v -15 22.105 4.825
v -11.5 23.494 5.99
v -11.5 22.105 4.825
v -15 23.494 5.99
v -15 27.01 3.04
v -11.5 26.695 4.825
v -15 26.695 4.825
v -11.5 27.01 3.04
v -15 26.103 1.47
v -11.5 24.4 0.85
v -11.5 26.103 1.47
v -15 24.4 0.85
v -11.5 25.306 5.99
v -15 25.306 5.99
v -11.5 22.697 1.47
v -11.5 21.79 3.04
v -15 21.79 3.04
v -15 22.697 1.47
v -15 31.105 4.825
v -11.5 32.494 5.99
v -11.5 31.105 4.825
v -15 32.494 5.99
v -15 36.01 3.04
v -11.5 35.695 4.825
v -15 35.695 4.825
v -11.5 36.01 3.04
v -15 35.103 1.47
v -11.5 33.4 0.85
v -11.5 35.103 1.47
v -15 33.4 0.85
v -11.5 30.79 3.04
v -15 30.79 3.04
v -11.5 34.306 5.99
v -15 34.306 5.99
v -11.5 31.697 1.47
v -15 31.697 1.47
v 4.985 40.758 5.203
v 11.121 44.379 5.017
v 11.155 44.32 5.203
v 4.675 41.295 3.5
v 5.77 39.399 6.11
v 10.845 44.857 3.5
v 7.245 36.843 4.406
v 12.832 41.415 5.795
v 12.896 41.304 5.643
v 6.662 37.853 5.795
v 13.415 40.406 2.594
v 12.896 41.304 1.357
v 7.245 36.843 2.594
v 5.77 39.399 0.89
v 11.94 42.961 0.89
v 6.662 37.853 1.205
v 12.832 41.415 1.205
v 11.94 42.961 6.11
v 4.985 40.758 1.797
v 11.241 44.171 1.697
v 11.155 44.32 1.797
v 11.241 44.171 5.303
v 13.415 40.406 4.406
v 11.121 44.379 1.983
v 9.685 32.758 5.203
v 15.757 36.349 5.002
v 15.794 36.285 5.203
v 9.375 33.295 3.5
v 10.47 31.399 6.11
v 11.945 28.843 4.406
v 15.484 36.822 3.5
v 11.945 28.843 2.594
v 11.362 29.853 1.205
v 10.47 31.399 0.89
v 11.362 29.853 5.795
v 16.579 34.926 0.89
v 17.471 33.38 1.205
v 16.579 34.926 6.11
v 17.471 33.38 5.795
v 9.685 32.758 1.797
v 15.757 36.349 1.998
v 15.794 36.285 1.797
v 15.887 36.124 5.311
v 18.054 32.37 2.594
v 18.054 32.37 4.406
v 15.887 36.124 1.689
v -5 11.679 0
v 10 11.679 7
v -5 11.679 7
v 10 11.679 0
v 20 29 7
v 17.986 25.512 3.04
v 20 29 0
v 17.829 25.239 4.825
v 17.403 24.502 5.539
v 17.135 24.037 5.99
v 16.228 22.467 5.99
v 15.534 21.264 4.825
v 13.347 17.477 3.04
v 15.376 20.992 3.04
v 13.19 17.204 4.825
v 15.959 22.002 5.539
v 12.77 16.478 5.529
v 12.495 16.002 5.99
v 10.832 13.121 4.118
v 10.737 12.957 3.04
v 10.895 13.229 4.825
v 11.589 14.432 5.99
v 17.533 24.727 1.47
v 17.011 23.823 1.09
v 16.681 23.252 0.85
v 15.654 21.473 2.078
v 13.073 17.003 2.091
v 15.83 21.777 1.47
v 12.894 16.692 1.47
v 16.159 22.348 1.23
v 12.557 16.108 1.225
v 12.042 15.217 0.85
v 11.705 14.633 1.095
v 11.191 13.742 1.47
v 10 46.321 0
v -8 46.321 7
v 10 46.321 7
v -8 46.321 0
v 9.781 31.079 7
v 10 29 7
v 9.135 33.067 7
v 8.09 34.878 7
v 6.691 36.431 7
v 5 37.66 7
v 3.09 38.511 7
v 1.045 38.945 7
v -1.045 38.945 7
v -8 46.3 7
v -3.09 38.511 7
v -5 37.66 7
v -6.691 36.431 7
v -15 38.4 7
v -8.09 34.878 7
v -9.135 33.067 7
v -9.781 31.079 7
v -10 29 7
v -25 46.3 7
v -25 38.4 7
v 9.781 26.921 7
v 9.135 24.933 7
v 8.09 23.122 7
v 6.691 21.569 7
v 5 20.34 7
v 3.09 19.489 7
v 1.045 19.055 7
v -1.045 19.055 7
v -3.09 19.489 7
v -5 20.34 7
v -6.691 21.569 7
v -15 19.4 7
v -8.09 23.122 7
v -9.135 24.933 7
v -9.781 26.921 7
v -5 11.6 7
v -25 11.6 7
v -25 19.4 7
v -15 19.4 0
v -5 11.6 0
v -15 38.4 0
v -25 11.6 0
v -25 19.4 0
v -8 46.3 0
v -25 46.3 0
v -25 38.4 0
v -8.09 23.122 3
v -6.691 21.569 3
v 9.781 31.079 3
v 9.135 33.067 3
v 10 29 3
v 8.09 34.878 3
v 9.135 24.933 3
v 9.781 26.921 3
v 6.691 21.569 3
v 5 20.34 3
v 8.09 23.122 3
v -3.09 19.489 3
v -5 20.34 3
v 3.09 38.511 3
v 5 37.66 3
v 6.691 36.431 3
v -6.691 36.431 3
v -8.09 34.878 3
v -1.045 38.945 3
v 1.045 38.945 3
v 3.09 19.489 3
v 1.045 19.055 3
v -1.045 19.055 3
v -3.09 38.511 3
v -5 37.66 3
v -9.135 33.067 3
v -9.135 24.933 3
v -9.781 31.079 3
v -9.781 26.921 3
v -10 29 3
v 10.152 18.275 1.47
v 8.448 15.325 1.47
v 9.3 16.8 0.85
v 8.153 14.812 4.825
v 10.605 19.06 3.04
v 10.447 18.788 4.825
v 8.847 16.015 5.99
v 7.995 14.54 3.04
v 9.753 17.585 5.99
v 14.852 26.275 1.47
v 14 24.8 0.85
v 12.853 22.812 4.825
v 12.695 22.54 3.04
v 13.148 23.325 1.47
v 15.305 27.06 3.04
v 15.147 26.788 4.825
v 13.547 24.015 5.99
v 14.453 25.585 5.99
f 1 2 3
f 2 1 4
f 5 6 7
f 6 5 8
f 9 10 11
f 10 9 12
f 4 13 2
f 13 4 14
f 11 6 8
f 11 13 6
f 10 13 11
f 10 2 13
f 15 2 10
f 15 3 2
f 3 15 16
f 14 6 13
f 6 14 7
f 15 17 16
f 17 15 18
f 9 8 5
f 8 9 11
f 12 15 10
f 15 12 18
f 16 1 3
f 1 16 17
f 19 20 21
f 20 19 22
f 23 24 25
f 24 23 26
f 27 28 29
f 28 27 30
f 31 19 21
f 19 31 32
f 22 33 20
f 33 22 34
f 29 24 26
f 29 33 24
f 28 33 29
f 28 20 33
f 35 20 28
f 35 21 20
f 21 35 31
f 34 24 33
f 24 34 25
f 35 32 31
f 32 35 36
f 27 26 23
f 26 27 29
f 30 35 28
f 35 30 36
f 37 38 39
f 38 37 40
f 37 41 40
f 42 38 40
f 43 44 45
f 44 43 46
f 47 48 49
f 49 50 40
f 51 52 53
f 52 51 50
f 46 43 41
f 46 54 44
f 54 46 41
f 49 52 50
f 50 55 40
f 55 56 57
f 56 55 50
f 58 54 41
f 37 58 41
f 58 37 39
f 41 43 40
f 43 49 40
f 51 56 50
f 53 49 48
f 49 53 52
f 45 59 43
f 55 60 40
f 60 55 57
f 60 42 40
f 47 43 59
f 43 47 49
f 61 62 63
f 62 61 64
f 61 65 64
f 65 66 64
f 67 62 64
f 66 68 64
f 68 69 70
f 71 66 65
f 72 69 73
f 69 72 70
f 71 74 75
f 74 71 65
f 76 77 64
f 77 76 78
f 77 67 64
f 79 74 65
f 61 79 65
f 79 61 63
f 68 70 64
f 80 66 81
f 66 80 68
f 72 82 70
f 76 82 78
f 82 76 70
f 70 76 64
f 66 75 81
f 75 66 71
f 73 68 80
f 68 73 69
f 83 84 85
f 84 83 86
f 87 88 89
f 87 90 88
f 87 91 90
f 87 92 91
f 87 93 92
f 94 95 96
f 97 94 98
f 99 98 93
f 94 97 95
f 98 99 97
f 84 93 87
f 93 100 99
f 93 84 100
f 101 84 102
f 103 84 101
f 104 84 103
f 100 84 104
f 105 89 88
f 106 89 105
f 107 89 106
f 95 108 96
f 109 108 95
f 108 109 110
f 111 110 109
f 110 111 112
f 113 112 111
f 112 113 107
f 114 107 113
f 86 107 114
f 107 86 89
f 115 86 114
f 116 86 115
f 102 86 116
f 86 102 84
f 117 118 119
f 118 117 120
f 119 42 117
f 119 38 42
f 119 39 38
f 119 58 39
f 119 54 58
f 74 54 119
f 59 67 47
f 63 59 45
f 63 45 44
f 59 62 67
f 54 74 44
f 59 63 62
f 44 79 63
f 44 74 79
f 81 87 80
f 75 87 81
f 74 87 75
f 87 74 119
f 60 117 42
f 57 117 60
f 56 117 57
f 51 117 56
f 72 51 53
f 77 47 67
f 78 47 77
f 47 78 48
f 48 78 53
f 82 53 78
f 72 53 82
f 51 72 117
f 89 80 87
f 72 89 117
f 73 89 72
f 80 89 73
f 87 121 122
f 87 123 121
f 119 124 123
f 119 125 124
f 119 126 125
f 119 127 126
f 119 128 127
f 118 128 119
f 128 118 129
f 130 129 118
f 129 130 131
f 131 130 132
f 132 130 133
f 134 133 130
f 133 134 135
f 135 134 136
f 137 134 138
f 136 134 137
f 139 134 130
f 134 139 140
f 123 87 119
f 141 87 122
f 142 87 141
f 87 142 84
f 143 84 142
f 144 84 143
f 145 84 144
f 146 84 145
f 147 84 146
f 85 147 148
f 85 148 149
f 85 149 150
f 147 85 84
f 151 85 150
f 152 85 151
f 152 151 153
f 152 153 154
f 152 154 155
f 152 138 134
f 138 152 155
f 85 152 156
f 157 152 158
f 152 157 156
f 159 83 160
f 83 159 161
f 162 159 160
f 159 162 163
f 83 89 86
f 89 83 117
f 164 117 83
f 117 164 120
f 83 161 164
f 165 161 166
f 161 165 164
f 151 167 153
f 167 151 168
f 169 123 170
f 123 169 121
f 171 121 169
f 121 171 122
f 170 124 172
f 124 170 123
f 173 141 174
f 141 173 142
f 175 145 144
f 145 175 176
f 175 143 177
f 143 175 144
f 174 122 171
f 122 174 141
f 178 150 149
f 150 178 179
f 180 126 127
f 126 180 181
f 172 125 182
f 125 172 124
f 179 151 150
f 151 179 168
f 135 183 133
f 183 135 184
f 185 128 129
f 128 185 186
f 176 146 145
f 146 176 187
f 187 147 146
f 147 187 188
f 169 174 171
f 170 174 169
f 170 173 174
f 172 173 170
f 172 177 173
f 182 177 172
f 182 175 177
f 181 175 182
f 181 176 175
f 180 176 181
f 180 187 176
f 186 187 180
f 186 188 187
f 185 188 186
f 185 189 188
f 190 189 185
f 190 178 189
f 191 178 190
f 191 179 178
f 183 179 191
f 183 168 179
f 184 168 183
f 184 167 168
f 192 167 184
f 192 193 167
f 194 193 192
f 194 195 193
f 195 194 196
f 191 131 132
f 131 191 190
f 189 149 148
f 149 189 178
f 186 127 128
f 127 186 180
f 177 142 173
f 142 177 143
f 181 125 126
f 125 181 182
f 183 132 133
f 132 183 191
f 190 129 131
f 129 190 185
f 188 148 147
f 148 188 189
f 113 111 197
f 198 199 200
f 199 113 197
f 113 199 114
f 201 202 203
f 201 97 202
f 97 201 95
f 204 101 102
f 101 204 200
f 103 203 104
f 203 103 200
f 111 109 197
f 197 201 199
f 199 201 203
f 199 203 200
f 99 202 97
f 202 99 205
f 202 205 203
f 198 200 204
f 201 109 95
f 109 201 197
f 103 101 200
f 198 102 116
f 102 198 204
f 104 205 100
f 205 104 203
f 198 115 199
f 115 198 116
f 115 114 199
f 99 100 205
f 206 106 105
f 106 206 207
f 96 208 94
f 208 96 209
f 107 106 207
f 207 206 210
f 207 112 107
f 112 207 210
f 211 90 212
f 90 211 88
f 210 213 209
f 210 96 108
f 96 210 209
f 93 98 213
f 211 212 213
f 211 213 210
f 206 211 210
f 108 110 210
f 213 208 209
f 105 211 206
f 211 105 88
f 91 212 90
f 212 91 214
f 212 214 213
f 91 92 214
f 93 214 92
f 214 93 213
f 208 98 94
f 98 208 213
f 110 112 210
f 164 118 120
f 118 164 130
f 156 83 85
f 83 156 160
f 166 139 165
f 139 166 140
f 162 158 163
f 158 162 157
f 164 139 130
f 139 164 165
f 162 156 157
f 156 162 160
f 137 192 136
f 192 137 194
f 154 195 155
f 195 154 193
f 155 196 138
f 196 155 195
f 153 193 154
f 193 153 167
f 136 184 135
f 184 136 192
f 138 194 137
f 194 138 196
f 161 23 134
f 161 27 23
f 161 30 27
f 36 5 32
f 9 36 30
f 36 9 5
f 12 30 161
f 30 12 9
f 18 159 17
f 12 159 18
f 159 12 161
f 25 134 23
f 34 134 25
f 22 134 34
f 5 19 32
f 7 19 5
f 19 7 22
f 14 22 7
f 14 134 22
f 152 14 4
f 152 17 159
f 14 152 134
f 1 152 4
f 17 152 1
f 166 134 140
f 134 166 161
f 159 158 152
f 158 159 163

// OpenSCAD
z=7; //высота
g=3.5; //глубина дырок 
//дексибироза
translate ([0,79,0]) {
difference () {
translate([0,-50,0])cylinder(z,20,20, $fn=6);
translate ([0,-50,3])cylinder(4.2,10,10);
translate ([-7,0,0]) {
rotate([0, 90, 0]) translate([-3.5,-54.6,-17+g]) cylinder(9,2.65,2.65);        
rotate([0, 90, 0]) translate([-3.5,-45.6,-17+g]) cylinder(9,2.65,2.65);          
}  
translate ([9.3,-62.2,3.5])rotate([0,90,-30])cylinder (4.5+g,2.65,2.65);
translate ([14,-54.2,3.5])rotate([0,90,-30])cylinder (4.5+g,2.65,2.65);
translate ([-28,-73,-1])cube ([20,45,9]);

translate ([2,-80,0]) {
translate ([4,40,g])rotate ([90,0,120])cylinder(4.5+g,2.65,2.65);   
translate ([4+4.7,37.5+-9+g,g])rotate ([90,0,120])cylinder(4.5+3.5,2.65,2.65); 
  }  
 }
difference () {
translate ([-25,-67.4,0])cube ([20,34.7,7]);
translate ([0,-50,3])cylinder(4.2,10,10);
translate ([-7,0,0]) {
rotate([0, 90, 0]) translate([-3.5,-54.6,-17+g]) cylinder(9,2.65,2.65);        
rotate([0, 90, 0]) translate([-3.5,-45.6,-17+g]) cylinder(9,2.65,2.65);          
}  

translate ([-35,-59.6,-1])cube ([20,19,12]);
 }
}
